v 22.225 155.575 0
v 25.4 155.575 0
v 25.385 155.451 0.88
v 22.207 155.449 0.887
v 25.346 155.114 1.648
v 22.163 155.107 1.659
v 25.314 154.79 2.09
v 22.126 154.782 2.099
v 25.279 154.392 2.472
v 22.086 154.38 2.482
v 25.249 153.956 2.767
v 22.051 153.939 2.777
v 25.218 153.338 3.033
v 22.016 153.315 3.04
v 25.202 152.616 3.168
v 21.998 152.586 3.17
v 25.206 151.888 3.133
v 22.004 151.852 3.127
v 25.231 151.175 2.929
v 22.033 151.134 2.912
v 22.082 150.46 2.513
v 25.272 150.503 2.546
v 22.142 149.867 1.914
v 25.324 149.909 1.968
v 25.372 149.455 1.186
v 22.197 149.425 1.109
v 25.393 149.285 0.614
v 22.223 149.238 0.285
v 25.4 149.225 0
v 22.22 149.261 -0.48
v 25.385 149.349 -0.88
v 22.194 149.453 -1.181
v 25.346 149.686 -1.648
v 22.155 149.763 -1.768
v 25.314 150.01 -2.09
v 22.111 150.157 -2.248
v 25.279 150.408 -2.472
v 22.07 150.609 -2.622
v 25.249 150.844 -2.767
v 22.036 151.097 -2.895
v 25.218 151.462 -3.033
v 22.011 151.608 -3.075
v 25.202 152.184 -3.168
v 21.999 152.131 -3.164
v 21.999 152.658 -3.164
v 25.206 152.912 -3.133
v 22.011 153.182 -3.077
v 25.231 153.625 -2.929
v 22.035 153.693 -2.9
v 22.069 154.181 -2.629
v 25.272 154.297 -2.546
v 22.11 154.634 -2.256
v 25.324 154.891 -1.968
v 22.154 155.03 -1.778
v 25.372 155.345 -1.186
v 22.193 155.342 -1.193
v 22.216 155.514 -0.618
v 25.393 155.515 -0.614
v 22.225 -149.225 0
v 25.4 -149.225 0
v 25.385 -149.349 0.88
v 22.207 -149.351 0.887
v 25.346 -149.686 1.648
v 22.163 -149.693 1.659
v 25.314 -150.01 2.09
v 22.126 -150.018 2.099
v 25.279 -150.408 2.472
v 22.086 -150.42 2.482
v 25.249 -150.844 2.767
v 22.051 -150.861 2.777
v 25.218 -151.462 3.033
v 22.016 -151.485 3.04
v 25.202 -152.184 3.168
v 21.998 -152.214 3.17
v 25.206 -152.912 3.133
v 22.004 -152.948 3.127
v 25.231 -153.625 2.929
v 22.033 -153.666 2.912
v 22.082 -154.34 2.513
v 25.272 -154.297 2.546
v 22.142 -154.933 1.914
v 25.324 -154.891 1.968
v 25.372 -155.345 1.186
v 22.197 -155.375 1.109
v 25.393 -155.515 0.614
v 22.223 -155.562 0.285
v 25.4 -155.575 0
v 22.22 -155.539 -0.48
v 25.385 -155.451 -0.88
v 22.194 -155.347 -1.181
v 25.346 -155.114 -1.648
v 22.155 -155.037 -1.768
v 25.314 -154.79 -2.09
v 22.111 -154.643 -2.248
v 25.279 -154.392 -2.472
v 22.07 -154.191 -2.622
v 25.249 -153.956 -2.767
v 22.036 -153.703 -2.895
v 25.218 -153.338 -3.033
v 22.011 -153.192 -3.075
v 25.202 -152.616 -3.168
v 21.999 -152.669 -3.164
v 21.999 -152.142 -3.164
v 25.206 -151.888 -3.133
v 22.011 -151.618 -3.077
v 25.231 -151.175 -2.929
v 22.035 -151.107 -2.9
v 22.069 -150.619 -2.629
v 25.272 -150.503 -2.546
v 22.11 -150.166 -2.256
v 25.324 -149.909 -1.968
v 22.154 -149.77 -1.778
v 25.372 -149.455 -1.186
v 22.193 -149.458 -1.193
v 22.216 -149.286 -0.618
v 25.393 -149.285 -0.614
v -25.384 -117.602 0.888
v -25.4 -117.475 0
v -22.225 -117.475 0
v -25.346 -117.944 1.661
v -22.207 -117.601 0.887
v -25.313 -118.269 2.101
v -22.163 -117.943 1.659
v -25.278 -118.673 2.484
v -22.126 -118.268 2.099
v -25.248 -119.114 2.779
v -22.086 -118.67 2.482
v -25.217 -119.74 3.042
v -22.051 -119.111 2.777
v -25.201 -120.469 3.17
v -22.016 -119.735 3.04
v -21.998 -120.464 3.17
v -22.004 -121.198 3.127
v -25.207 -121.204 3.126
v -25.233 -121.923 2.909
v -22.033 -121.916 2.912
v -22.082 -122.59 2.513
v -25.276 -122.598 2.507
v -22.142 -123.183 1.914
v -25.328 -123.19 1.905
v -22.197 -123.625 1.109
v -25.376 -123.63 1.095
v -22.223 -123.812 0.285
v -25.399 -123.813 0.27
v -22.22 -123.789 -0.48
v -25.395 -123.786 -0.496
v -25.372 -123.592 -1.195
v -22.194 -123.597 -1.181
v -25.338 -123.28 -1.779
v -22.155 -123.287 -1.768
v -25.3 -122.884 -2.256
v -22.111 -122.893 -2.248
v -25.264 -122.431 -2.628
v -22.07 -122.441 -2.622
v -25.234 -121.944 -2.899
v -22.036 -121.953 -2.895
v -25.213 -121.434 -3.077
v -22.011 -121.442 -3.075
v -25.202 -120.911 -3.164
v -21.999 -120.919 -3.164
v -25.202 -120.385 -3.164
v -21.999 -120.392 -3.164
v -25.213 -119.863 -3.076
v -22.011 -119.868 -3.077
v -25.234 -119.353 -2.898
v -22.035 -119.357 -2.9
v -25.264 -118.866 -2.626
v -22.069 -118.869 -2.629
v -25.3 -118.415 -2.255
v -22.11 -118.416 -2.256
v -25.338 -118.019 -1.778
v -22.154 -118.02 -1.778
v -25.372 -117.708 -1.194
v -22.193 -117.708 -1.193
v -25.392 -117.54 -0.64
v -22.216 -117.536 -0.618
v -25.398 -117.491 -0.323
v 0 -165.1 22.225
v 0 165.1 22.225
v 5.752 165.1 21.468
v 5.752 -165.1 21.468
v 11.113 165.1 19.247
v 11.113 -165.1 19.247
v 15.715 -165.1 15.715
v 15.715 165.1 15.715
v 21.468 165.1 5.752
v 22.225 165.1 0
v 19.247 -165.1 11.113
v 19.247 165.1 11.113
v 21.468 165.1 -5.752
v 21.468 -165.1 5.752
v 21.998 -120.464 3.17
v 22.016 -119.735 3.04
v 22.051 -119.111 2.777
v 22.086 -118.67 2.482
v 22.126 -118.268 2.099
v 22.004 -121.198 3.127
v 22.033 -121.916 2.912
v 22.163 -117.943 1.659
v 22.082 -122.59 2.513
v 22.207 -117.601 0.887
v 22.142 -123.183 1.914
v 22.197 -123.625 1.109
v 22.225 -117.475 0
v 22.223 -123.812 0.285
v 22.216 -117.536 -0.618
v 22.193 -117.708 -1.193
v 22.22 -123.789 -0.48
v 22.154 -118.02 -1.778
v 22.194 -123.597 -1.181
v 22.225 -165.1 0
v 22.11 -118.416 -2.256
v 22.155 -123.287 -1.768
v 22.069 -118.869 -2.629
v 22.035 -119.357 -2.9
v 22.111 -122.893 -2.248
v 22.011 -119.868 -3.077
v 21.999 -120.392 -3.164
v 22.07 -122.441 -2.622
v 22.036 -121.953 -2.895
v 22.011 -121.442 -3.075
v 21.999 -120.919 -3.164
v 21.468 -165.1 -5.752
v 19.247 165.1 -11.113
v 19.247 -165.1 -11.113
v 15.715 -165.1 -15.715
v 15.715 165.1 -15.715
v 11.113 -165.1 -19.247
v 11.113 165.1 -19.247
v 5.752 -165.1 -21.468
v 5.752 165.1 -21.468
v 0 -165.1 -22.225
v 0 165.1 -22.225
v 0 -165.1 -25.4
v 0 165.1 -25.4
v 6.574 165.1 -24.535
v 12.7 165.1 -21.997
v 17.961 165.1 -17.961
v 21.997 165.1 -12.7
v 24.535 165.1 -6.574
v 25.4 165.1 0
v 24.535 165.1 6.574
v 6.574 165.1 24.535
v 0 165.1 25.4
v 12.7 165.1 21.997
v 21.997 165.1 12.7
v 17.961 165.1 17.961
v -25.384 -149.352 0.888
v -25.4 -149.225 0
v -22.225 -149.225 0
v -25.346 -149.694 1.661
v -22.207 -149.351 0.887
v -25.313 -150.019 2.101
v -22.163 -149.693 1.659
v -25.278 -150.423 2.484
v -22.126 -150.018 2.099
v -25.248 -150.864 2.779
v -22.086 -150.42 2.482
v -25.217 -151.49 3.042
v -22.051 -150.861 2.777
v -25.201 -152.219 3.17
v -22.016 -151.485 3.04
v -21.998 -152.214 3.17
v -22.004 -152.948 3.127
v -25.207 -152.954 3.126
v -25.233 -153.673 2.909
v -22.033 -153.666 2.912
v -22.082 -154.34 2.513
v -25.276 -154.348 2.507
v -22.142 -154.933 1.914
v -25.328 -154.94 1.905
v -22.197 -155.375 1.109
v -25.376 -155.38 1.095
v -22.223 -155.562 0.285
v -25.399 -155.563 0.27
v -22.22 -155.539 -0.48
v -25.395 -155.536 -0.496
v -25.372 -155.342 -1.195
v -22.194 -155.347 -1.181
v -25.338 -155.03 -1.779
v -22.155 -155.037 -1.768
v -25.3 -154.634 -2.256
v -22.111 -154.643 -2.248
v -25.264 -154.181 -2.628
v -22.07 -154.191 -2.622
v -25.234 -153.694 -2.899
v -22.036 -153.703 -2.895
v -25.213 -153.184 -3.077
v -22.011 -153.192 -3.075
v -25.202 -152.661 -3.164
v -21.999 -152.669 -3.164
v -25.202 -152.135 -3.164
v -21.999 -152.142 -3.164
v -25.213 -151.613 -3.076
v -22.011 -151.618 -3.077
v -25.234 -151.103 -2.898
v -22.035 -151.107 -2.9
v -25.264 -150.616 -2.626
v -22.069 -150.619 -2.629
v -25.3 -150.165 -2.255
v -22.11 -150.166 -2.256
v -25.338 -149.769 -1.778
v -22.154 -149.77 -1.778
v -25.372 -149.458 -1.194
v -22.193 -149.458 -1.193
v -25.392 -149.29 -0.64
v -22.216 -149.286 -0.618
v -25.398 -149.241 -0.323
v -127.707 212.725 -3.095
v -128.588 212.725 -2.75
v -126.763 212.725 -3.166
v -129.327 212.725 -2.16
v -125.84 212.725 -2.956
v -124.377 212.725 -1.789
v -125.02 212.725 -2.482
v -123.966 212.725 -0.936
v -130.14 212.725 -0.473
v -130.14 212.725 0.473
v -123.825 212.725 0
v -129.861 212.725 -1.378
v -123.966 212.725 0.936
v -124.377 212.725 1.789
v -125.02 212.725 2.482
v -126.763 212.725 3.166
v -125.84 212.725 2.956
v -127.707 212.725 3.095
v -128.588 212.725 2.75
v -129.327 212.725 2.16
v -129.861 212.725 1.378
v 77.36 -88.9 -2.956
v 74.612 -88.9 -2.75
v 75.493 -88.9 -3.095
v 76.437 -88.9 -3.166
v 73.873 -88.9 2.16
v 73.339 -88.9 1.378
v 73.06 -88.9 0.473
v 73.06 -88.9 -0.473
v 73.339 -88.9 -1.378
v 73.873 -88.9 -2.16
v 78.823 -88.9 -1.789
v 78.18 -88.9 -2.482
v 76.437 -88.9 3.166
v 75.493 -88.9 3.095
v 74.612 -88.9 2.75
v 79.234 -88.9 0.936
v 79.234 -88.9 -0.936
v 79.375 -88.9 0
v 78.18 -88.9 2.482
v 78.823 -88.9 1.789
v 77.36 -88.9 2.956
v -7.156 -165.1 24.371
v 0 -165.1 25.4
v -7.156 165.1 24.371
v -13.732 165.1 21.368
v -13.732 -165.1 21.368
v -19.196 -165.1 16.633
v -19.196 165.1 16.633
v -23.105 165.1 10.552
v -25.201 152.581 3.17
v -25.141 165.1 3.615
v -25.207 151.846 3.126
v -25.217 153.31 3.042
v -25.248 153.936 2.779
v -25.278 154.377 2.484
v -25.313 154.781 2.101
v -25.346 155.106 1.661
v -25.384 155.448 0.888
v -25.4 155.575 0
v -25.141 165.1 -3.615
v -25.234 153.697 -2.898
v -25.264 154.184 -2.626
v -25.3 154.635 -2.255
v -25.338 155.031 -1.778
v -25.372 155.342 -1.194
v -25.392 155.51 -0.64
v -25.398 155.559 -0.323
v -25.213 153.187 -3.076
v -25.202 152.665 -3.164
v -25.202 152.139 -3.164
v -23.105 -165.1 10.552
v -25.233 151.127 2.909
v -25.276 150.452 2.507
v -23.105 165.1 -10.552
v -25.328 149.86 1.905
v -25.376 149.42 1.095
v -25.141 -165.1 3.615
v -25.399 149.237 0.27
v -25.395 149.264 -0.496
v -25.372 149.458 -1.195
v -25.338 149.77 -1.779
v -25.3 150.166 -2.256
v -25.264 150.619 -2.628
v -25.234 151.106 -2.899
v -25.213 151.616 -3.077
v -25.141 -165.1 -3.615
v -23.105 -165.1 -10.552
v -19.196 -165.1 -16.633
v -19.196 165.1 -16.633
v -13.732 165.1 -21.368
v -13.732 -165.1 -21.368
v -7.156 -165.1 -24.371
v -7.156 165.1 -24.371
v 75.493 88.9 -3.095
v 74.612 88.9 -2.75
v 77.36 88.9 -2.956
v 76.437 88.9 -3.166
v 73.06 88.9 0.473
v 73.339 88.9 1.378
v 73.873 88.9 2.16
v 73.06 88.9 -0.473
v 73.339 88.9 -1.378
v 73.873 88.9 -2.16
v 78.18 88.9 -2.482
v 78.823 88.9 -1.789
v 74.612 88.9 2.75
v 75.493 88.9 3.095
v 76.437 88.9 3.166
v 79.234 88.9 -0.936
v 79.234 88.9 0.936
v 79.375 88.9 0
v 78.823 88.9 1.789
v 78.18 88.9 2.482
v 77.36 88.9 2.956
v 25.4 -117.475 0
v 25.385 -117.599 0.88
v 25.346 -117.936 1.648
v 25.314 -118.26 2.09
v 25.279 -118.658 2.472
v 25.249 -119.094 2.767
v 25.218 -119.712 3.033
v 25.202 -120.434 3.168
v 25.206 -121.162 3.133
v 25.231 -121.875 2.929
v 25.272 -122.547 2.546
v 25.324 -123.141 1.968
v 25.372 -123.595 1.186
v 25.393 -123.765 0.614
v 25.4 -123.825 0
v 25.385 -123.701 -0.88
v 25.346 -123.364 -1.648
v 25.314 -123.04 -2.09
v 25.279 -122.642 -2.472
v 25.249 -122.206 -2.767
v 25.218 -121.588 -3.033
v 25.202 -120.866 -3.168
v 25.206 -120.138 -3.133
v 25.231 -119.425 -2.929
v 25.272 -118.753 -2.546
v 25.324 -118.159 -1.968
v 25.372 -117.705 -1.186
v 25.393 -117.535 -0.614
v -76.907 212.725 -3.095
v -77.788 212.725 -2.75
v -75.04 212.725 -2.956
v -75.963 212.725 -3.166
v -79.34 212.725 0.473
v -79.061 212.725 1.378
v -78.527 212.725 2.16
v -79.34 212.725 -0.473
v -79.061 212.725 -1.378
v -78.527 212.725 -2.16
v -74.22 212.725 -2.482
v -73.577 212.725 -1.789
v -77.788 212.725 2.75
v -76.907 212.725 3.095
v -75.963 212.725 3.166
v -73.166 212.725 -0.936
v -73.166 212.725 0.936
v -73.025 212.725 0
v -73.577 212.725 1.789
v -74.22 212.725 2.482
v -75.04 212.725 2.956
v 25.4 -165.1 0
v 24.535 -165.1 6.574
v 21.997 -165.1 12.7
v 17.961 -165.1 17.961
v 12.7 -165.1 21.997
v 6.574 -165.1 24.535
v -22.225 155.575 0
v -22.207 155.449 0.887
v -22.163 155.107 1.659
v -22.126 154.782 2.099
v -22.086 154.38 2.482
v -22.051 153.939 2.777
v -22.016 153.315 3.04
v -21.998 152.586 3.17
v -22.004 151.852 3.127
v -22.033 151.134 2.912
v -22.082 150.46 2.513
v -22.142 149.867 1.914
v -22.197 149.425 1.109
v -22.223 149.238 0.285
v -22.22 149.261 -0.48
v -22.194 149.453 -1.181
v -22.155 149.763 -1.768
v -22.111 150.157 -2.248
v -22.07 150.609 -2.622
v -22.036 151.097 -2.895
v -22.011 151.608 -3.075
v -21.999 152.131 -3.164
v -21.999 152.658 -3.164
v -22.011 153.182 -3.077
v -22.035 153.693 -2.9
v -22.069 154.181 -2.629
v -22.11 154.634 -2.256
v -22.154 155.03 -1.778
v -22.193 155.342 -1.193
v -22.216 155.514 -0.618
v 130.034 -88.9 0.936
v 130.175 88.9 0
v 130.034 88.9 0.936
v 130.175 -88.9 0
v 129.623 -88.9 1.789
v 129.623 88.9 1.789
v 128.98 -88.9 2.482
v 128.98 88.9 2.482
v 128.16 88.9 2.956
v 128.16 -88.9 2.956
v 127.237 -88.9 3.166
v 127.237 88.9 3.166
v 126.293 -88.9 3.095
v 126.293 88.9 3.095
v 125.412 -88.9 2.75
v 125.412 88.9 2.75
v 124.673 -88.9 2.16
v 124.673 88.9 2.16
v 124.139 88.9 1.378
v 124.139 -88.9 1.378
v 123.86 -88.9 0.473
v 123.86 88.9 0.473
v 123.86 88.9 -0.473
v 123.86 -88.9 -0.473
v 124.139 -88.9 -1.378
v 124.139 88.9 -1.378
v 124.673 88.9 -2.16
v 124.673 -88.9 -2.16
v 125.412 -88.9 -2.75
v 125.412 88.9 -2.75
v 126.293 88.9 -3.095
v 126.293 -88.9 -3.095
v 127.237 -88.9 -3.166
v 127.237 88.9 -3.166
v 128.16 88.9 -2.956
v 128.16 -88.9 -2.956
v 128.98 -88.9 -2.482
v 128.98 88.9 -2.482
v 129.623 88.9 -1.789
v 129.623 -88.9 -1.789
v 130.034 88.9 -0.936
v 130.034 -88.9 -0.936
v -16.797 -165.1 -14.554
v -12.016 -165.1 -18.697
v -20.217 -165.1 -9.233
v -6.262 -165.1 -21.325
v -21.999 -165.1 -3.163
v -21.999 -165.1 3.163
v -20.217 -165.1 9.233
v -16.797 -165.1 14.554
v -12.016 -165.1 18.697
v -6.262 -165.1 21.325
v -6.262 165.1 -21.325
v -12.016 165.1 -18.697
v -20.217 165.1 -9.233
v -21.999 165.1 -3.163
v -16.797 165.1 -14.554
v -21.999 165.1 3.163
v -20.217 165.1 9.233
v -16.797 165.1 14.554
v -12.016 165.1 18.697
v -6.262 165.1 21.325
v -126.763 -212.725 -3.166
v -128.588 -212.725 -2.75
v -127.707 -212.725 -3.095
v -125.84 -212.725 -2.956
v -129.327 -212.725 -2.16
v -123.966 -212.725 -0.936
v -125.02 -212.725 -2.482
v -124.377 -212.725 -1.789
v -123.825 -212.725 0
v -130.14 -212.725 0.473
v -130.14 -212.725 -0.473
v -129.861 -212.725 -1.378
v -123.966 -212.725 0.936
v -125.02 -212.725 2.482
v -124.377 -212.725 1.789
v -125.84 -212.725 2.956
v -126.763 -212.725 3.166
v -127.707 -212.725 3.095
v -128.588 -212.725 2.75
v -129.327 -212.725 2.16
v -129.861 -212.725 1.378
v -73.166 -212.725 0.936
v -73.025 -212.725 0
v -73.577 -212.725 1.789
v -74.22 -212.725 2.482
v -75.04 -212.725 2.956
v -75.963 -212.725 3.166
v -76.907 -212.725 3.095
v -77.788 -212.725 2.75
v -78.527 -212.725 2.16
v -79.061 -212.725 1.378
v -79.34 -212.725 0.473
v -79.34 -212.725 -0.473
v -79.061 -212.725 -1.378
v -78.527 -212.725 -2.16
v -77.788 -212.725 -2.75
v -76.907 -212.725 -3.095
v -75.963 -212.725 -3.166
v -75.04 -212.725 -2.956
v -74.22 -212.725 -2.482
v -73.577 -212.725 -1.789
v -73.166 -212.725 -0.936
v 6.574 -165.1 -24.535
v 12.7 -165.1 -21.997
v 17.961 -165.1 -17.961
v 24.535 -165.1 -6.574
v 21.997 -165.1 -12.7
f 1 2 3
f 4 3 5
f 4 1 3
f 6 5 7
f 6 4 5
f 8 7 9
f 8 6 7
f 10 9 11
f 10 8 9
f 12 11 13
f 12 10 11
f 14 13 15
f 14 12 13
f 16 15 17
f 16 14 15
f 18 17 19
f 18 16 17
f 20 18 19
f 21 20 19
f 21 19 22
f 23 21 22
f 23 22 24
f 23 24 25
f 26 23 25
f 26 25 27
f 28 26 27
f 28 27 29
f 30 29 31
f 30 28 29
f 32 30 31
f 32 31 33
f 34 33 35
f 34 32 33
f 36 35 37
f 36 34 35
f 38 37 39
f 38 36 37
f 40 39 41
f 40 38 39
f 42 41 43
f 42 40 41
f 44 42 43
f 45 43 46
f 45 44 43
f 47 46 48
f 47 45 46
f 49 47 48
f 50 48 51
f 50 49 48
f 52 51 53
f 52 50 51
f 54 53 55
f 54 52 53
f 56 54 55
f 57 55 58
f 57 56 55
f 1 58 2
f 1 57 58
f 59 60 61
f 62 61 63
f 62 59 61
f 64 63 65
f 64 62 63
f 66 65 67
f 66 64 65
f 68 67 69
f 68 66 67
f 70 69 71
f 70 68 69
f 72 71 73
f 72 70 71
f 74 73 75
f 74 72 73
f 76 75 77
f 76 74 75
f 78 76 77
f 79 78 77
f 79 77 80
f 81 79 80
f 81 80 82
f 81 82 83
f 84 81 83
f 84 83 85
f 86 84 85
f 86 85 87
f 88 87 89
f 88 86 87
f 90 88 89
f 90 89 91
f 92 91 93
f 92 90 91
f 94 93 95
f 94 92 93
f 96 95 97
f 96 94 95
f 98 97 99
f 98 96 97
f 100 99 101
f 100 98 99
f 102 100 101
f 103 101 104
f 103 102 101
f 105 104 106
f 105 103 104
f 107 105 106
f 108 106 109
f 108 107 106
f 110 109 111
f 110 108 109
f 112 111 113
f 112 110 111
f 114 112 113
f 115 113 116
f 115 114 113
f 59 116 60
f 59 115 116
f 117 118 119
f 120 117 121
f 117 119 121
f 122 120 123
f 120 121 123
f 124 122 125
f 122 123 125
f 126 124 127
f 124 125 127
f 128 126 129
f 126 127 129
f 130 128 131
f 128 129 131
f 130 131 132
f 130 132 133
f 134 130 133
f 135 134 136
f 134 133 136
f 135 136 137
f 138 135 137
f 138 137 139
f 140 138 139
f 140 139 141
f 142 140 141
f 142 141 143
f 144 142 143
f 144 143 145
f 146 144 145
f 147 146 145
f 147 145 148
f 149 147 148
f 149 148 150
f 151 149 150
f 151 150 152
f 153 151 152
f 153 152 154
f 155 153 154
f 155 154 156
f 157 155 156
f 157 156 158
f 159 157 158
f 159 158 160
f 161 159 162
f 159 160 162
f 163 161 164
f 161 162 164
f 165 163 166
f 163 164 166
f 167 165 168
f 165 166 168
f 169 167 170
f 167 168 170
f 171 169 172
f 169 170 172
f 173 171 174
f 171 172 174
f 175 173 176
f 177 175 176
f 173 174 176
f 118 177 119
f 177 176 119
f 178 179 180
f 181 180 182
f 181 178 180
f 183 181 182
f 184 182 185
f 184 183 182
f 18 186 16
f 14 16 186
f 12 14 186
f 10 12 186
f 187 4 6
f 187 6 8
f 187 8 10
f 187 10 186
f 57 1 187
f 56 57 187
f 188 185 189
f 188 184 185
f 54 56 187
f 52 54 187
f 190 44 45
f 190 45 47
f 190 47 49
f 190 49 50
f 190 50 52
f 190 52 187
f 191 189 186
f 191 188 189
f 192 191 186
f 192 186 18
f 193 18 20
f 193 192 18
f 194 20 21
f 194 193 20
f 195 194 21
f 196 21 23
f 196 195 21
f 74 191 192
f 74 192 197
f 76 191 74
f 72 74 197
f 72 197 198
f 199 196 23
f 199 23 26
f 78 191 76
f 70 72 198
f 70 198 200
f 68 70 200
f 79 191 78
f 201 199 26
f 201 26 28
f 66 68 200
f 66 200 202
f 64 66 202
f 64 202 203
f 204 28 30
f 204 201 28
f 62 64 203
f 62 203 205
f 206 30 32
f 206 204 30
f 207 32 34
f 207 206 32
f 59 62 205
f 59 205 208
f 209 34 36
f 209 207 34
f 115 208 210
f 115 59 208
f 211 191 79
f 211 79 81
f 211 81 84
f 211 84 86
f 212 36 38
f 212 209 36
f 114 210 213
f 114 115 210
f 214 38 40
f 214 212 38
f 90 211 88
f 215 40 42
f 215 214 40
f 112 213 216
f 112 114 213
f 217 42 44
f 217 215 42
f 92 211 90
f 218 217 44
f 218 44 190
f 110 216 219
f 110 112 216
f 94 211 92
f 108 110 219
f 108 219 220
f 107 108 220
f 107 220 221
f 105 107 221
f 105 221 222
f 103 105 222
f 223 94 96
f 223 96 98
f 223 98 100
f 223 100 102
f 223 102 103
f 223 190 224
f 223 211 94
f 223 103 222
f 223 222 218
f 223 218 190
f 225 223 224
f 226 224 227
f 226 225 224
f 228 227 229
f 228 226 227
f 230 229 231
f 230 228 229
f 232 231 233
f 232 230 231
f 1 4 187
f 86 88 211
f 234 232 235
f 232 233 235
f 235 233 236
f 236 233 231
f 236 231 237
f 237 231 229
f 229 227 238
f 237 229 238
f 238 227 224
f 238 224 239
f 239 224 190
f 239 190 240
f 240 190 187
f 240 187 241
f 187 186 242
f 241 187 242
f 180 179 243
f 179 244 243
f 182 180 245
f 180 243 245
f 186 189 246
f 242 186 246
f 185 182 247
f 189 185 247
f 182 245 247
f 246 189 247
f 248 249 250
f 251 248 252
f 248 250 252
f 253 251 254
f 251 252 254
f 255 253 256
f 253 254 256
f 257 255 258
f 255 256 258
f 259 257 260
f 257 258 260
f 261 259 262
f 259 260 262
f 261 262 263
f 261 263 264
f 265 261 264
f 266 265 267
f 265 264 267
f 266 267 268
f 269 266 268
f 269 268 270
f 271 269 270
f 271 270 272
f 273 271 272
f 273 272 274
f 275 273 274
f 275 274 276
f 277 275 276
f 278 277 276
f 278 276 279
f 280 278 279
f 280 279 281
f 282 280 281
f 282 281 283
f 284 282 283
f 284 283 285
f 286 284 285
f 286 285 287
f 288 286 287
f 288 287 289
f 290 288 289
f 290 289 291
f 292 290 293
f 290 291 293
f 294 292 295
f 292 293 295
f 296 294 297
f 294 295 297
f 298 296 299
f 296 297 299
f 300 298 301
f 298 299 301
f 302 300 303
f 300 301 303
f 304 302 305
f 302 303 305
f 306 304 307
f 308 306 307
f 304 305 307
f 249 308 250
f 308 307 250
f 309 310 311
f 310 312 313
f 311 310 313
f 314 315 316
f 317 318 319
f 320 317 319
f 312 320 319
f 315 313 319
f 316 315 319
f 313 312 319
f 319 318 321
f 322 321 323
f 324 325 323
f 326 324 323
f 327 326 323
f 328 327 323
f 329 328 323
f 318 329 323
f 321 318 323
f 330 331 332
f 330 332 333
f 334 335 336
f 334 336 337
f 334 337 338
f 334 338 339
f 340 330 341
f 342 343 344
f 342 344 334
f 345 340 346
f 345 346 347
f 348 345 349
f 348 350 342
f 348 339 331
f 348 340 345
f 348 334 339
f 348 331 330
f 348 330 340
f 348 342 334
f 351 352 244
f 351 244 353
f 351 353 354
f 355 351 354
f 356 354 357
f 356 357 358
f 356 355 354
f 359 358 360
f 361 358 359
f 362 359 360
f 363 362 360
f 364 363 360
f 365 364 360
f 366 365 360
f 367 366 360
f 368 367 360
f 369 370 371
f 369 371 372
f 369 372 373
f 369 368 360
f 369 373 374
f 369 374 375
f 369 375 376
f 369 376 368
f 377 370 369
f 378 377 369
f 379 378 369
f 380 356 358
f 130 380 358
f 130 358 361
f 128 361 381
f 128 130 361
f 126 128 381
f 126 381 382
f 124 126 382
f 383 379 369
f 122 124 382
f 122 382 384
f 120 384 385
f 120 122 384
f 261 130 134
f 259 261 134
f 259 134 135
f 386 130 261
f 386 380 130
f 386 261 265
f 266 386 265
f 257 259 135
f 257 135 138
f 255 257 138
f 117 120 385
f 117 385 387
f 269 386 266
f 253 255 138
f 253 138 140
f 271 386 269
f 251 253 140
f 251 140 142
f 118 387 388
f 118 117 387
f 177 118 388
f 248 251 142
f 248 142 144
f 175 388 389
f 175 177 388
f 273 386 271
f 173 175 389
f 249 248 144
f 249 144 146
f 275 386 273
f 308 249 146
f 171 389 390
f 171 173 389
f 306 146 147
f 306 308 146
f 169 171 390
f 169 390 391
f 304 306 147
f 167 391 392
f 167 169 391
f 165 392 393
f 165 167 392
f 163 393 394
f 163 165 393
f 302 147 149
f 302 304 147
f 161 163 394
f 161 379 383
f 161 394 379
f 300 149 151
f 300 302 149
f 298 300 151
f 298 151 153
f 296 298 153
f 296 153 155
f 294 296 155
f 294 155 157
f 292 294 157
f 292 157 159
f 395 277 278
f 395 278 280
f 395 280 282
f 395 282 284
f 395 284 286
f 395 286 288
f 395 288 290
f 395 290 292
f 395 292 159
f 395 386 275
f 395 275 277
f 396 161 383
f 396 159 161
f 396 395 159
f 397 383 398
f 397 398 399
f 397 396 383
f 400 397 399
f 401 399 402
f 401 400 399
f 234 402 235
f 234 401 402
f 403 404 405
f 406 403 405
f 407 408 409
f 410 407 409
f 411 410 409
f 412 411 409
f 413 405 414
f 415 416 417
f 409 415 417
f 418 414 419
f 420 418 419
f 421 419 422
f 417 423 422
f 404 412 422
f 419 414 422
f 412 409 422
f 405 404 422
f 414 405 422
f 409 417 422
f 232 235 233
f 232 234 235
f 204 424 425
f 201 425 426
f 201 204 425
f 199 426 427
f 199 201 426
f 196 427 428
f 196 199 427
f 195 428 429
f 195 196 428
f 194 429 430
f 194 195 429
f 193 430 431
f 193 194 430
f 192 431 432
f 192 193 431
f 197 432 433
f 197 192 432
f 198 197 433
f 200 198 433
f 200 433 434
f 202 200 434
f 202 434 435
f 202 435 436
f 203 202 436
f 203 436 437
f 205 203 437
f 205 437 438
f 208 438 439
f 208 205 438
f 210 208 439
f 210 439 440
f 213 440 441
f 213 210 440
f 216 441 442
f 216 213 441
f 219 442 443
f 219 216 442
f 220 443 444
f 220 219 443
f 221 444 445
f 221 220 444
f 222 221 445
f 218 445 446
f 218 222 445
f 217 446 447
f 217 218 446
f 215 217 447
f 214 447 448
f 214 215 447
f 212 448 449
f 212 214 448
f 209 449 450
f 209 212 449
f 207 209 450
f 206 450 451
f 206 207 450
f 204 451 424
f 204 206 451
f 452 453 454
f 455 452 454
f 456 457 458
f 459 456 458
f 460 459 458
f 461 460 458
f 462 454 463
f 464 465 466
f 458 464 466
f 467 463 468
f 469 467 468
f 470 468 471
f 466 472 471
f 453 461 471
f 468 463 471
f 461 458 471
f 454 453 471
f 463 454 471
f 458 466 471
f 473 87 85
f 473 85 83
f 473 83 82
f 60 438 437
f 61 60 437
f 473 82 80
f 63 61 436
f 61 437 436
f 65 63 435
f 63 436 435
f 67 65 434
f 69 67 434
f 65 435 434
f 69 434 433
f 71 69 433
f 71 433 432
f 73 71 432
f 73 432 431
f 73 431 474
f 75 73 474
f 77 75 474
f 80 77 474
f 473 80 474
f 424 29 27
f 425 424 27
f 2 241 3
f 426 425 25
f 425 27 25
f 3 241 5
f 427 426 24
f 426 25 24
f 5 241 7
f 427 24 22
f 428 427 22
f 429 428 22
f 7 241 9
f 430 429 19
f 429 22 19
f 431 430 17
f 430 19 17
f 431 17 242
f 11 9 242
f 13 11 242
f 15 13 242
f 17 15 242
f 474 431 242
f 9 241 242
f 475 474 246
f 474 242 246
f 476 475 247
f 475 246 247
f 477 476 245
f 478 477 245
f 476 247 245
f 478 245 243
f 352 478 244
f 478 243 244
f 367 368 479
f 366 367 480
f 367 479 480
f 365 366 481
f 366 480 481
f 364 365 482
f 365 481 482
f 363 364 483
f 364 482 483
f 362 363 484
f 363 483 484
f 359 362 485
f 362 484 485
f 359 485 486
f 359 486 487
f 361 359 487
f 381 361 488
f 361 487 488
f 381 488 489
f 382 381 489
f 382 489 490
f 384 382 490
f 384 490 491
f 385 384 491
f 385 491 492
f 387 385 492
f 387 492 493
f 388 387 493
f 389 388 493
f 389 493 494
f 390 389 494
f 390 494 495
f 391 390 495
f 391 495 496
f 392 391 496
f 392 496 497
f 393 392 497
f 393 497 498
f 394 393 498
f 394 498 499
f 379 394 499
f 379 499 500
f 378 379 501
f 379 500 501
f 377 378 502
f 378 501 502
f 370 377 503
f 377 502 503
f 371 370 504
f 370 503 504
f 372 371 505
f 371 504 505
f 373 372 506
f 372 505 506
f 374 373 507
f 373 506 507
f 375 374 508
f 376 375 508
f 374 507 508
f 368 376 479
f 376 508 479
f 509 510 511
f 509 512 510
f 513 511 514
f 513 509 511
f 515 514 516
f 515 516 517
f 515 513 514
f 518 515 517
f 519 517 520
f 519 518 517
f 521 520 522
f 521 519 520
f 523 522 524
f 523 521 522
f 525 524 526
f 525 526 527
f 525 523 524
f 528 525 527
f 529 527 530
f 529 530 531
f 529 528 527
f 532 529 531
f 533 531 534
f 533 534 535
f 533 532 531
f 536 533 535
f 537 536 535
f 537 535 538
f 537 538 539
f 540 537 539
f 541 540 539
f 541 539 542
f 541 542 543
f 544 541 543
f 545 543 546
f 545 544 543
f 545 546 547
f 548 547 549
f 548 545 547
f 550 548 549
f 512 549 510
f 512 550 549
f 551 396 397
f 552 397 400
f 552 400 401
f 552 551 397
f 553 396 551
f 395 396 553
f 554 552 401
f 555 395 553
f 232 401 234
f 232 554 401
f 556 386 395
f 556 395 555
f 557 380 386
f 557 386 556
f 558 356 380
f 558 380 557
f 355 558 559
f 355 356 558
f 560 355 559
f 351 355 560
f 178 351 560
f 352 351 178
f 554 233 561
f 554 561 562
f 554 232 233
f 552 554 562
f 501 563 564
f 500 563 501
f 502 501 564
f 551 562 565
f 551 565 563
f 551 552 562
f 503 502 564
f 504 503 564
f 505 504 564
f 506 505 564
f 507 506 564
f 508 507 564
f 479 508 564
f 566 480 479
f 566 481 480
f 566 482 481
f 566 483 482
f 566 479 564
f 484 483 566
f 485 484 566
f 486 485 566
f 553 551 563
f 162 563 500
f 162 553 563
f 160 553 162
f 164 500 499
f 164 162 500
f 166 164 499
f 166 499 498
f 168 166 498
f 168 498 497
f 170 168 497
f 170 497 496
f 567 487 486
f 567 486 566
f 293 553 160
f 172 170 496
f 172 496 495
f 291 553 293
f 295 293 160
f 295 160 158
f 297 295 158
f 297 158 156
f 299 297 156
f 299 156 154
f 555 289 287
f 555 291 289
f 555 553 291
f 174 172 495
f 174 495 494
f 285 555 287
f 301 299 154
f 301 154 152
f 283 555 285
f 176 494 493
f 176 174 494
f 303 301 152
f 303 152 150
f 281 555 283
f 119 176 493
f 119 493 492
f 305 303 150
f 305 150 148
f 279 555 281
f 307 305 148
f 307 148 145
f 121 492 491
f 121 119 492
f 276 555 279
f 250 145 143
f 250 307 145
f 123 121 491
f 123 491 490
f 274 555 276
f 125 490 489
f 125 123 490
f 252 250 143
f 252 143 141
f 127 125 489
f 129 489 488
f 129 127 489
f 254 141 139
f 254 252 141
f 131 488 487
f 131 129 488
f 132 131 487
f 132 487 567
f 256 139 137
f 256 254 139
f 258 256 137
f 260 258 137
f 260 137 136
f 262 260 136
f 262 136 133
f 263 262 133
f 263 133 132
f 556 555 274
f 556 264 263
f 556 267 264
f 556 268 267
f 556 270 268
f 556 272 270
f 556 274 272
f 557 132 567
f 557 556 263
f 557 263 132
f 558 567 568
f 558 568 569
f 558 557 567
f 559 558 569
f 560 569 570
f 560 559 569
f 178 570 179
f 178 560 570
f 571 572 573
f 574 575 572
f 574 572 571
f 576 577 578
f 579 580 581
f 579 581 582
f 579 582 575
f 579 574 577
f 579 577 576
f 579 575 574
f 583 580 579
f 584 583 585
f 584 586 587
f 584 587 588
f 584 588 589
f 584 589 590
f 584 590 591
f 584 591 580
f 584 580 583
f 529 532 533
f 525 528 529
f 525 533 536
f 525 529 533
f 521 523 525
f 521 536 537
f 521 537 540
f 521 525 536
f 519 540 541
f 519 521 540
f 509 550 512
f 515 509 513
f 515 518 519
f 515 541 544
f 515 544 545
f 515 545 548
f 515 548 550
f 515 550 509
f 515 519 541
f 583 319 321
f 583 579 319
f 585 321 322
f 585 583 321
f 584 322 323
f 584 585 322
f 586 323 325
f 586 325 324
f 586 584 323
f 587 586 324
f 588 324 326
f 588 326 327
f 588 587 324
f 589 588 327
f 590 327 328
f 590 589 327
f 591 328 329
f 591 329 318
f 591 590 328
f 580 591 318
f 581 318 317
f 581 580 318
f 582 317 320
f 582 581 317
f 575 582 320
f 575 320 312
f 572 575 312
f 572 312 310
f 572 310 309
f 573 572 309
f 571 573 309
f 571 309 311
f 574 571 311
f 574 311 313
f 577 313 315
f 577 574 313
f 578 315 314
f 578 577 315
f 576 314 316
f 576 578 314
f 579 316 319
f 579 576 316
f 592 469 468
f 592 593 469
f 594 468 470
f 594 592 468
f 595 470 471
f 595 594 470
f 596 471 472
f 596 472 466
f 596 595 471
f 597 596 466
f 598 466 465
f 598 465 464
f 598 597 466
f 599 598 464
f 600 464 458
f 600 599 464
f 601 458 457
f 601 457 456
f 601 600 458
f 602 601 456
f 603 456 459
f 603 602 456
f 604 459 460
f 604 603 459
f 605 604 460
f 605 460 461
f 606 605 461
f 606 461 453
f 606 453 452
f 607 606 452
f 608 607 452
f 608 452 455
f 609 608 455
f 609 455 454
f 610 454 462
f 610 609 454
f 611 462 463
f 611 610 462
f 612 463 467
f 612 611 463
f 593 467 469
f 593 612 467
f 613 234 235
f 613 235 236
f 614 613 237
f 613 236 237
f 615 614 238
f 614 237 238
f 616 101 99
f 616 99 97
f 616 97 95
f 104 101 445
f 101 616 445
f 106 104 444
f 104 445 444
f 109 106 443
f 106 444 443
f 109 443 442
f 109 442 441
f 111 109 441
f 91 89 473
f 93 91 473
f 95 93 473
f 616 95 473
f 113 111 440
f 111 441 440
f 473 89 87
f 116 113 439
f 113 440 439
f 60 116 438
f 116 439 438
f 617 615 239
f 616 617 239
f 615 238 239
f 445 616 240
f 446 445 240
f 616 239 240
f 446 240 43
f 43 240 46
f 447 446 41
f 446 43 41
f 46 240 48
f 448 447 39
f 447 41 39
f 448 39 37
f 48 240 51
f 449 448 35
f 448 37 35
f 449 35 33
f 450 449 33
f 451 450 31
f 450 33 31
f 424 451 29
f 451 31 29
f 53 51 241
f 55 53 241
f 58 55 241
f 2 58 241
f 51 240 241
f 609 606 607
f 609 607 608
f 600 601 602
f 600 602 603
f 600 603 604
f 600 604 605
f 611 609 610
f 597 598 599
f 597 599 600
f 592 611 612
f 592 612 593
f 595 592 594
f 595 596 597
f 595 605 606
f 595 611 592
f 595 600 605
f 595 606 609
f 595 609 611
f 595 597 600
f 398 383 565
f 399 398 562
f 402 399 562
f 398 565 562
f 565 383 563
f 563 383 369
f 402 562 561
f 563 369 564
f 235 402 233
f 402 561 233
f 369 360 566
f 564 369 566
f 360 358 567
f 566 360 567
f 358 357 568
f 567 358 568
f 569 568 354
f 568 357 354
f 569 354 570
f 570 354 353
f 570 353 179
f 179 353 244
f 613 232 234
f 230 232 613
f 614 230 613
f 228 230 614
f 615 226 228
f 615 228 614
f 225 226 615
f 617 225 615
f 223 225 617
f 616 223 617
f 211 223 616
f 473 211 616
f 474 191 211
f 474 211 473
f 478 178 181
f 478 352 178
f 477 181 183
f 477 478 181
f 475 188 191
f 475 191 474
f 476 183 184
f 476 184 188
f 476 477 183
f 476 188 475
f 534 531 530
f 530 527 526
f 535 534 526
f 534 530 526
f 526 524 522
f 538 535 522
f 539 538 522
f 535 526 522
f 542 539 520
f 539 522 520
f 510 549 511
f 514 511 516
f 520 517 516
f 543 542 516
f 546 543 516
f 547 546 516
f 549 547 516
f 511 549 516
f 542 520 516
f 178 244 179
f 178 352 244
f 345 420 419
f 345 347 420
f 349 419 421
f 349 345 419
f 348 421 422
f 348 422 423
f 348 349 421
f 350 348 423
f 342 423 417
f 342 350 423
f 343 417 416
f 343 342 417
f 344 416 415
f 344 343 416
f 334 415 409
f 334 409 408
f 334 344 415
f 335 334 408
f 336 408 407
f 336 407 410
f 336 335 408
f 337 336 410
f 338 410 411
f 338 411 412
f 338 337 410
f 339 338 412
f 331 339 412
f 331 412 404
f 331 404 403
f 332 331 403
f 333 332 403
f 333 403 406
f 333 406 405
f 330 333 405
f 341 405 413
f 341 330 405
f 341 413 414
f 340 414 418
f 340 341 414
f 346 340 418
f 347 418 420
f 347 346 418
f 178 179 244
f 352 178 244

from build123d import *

# Parameters (mm, degrees)
F1_DEPTH      = 165.1
F2_DEPTH      = 165.1
F4_R          = 3.175
F5_DEPTH      = 25.401
F5_DEPTH_BACK = 25.401
F3_R          = 3.175
F6_DEPTH      = 212.725
F7_DEPTH      = 88.9


with BuildPart() as f1:
    # F0 (on Front) → F1 (new body, symmetric)
    with BuildSketch(Plane.XZ):
        with BuildLine():
            ThreePointArc((0, -22.225), (-22.225, 0), (0, 22.225))
            Line((0, 22.225), (0, 25.4))
            ThreePointArc((0, 25.4), (-25.4, 0), (0, -25.4))
            Line((0, -25.4), (0, -22.225))
        make_face()
    extrude(amount=F1_DEPTH, both=True)


with BuildPart() as f2:
    # F0 (on Front) → F2 (new body, symmetric)
    with BuildSketch(Plane.XZ):
        with BuildLine():
            ThreePointArc((0, 22.225), (15.7154482119, 15.7154482119), (22.225, 0))
            ThreePointArc((22.225, 0), (15.7154482119, -15.7154482119), (0, -22.225))
            Line((0, -22.225), (0, -25.4))
            ThreePointArc((0, -25.4), (17.9605122421, -17.9605122421), (25.4, 0))
            ThreePointArc((25.4, 0), (17.9605122421, 17.9605122421), (0, 25.4))
            Line((0, 25.4), (0, 22.225))
        make_face()
    extrude(amount=F2_DEPTH, both=True)


with BuildPart() as f5_tool:
    # F4 (on Right) → F5 (new body, two sides)
    with BuildSketch(Plane.YZ) as f5_sk:
        with Locations((-152.4, 0)):
            Circle(F4_R)
        with Locations((152.4, 0)):
            Circle(F4_R)
        with Locations((-120.65, 0)):
            Circle(F4_R)
    extrude(amount=-F5_DEPTH)
    extrude(f5_sk.sketch, amount=F5_DEPTH_BACK)


with BuildPart() as f1_1:
    add(f1.part)

    # F5: cut by f5_tool
    add(f5_tool.part, mode=Mode.SUBTRACT)


with BuildPart() as f2_1:
    add(f2.part)

    # F5: cut by f5_tool
    add(f5_tool.part, mode=Mode.SUBTRACT)


with BuildPart() as f6:
    # F3 (on Front) → F6 (new body, symmetric)
    with BuildSketch(Plane.XZ):
        with Locations((-127, 0)):
            Circle(F3_R)
    extrude(amount=F6_DEPTH, both=True)


with BuildPart() as f6b:
    # F3 (on Front) → F6, piece 2 (new body, symmetric)
    with BuildSketch(Plane.XZ):
        with Locations((-76.2, 0)):
            Circle(F3_R)
    extrude(amount=F6_DEPTH, both=True)


with BuildPart() as f7:
    # F3 (on Front) → F7 (new body, symmetric)
    with BuildSketch(Plane.XZ):
        with Locations((76.2, 0)):
            Circle(F3_R)
    extrude(amount=F7_DEPTH, both=True)


with BuildPart() as f7b:
    # F3 (on Front) → F7, piece 2 (new body, symmetric)
    with BuildSketch(Plane.XZ):
        with Locations((127, 0)):
            Circle(F3_R)
    extrude(amount=F7_DEPTH, both=True)


solid = Compound([f1_1.part, f2_1.part, f6.part, f6b.part, f7.part, f7b.part])
